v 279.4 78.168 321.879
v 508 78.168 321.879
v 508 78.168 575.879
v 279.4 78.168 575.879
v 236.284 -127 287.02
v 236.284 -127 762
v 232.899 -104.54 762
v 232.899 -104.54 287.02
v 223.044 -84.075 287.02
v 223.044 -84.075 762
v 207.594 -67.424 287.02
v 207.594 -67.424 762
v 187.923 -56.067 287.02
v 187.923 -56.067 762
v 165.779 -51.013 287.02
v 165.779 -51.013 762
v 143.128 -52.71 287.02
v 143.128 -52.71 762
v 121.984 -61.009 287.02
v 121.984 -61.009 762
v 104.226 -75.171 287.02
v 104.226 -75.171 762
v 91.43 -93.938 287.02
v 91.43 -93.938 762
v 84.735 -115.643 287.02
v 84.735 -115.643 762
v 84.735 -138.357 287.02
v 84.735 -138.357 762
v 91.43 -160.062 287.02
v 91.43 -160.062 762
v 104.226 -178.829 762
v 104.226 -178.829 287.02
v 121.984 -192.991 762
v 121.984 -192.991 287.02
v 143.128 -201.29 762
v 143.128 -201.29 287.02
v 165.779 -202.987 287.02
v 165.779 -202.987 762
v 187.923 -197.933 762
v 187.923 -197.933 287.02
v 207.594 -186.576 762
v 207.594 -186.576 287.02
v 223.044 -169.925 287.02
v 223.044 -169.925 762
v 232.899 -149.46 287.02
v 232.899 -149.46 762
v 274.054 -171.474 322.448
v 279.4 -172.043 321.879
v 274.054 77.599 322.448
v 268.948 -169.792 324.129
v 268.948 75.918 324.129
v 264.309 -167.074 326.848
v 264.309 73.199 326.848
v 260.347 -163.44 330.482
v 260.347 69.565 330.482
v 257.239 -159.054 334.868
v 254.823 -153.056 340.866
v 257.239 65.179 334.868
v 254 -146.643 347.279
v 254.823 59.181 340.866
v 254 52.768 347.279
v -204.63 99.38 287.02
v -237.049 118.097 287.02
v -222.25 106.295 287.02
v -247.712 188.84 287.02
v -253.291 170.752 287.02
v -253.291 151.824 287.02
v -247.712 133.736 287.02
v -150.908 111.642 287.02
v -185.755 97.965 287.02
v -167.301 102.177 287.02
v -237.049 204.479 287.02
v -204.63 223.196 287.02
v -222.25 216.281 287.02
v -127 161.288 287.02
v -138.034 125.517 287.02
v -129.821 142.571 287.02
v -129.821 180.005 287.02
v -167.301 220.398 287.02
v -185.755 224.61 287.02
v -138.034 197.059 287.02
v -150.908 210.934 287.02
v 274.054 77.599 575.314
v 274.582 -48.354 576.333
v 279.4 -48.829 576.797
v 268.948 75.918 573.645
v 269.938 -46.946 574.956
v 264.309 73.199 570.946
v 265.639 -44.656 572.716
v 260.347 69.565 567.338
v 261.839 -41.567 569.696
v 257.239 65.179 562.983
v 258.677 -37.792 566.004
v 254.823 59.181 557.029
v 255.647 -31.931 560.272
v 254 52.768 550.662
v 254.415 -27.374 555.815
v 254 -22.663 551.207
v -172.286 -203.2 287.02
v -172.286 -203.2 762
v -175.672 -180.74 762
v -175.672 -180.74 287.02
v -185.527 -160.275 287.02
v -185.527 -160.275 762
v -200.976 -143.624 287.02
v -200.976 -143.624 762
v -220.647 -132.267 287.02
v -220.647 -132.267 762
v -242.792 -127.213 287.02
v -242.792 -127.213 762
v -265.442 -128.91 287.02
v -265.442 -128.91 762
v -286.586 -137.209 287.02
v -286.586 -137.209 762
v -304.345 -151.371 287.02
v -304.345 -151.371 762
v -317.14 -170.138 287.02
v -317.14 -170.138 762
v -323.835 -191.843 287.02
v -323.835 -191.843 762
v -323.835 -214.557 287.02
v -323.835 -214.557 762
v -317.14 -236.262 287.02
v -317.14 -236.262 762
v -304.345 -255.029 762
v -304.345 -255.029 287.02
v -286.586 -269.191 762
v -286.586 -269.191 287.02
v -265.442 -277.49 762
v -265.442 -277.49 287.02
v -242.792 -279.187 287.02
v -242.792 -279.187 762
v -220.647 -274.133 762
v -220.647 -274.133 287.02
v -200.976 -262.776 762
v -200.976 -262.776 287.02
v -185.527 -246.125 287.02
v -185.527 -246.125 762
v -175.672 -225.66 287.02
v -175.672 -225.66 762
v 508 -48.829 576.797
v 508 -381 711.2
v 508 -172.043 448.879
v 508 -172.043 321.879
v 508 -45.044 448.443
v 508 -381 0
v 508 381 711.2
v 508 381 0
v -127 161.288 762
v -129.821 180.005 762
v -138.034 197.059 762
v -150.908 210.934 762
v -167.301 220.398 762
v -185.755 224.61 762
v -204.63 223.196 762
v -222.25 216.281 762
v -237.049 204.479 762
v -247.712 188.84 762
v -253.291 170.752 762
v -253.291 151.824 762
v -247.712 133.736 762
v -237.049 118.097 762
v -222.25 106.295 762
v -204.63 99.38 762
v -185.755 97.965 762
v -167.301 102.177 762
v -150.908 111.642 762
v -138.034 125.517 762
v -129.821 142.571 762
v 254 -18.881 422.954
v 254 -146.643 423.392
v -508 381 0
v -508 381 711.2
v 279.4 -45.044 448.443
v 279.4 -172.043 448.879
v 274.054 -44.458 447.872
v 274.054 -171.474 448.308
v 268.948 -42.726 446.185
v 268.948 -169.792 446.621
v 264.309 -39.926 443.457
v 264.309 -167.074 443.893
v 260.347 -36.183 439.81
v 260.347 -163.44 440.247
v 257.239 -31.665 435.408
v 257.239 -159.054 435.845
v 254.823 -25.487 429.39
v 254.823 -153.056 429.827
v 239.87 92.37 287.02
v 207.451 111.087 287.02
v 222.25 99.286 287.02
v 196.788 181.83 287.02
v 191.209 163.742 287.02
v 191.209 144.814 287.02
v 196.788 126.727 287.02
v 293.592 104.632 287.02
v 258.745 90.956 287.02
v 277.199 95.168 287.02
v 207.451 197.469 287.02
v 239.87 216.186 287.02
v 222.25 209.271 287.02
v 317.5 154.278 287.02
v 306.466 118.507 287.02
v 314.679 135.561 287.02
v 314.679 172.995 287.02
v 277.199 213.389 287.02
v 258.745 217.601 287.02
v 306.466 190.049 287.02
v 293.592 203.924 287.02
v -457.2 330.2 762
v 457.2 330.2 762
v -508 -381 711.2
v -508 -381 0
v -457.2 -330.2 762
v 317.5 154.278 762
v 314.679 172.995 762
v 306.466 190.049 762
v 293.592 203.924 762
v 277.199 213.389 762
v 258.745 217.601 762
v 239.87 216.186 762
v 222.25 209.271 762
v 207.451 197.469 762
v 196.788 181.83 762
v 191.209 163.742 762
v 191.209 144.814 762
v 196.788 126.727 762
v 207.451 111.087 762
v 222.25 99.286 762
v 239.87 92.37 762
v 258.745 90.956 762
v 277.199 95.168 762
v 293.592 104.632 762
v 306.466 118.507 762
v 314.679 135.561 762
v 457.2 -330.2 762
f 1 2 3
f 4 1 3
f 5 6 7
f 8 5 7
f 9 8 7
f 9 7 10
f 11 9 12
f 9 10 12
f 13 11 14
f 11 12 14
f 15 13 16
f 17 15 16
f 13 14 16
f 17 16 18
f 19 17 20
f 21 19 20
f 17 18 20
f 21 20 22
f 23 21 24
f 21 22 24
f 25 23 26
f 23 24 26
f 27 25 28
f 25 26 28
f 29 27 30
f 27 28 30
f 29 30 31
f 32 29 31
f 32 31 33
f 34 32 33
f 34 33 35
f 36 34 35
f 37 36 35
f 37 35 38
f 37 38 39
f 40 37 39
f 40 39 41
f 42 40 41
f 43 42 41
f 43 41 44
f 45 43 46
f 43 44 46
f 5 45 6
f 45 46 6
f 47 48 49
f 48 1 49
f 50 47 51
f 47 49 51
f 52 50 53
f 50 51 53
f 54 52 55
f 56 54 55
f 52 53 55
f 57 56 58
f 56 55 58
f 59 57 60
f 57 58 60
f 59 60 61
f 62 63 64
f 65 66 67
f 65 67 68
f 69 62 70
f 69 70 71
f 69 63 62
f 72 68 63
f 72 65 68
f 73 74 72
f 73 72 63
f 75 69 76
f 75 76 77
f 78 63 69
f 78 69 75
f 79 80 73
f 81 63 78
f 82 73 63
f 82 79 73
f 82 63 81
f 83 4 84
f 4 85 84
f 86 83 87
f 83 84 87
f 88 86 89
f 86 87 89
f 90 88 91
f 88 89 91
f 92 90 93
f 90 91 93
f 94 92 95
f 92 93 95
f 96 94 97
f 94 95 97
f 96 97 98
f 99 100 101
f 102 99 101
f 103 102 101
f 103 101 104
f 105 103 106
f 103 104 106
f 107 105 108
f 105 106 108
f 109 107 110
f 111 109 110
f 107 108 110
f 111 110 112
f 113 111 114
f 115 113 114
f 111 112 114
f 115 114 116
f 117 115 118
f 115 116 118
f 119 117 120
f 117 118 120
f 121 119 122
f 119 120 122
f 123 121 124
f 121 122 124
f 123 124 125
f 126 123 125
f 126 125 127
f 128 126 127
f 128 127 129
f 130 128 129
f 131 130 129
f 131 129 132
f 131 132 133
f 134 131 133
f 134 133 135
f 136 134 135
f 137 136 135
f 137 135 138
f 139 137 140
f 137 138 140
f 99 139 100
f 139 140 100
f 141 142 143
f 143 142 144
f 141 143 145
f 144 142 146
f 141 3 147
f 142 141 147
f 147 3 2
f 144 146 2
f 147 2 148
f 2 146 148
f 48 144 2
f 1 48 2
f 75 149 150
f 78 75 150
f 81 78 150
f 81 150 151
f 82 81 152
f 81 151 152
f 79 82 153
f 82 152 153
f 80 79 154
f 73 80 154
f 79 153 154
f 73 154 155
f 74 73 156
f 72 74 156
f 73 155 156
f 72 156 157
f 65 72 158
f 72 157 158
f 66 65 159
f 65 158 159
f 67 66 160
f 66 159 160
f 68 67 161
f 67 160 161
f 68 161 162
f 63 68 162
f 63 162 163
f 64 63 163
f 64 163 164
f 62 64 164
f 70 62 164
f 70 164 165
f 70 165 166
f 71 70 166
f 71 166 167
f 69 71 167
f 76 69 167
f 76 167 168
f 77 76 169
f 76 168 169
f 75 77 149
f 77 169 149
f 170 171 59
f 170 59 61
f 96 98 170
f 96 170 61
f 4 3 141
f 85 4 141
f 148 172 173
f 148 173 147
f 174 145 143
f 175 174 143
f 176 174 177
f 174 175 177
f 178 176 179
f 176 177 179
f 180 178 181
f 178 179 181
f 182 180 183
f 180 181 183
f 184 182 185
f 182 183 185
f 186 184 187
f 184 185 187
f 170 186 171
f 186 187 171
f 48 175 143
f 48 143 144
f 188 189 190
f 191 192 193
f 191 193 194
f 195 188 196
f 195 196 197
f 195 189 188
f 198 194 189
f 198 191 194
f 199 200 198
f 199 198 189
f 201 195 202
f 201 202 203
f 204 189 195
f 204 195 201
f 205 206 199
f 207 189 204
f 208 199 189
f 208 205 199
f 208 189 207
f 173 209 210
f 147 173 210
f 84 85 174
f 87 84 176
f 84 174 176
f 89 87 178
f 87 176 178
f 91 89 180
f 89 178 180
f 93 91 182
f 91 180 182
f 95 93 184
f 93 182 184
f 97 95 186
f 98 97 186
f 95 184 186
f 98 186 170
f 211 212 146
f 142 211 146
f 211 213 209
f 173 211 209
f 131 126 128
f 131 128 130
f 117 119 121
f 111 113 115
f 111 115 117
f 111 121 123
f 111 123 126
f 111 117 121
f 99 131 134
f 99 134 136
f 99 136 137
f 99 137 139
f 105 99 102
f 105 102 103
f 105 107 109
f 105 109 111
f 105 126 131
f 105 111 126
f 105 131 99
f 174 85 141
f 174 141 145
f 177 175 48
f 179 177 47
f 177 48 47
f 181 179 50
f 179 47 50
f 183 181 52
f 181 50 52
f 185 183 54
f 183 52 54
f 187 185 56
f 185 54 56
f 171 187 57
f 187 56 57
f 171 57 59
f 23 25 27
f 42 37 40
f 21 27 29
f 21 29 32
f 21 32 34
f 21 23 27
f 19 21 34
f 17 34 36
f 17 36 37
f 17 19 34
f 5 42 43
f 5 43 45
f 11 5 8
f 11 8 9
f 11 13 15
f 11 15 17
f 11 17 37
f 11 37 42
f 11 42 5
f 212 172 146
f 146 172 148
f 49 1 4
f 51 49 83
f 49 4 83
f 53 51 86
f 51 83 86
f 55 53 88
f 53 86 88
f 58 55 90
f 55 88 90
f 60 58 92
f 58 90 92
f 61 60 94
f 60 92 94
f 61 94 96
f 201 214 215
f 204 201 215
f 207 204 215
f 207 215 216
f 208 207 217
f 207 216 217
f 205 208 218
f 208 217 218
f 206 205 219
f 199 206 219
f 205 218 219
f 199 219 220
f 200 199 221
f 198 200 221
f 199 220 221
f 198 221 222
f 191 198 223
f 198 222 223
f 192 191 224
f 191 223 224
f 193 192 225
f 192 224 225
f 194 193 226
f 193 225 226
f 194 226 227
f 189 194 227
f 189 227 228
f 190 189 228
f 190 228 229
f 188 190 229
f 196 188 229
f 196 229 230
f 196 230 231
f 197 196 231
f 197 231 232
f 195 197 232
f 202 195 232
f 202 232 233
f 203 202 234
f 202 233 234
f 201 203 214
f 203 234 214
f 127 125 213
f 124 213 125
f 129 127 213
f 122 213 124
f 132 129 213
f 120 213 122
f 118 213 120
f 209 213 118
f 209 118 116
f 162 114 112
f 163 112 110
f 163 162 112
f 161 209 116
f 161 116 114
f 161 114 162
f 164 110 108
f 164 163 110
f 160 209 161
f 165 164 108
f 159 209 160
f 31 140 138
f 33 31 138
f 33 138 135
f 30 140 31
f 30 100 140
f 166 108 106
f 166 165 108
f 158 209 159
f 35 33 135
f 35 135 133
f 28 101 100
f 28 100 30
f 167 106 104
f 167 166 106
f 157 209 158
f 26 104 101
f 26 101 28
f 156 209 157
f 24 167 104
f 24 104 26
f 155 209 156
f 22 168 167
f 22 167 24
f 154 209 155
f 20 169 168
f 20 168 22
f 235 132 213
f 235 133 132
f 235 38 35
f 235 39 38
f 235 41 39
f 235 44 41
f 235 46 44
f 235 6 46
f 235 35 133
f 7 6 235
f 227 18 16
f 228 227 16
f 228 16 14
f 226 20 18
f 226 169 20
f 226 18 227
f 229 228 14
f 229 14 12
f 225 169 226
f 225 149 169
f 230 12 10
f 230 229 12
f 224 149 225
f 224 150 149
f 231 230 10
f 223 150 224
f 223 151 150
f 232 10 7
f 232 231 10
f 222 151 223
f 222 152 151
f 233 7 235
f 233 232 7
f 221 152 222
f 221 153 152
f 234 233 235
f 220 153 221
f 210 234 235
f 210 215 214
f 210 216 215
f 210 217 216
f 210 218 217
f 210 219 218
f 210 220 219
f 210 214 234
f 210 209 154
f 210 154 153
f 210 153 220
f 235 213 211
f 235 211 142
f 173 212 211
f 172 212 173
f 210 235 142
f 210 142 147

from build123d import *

# Parameters (mm, degrees)
F0_W     = 1016
F0_H     = 762
F1_DEPTH = 762
F2_SIZE  = 50.8
F3_R     = 63.5
F3_R_2   = 76.2
F4_DEPTH = 474.98
F6_DEPTH = 254
F7_R     = 25.4


with BuildPart() as f1:
    # F0 (on Top) → F1 (new body)
    with BuildSketch(Plane.XY):
        Rectangle(F0_W, F0_H)
    extrude(amount=F1_DEPTH)

    # F2
    f2_edges = [f1.edges().sort_by_distance(p)[0] for p in [
        (0, -381, 762),
        (508, 0, 762),
        (0, 381, 762),
        (-508, 0, 762),
    ]]
    chamfer(f2_edges, length=F2_SIZE)

    # F3 (on face) → F4 (cut)
    with BuildSketch(Plane.XY.offset(762)):
        with Locations((254, 154.278123)):
            Circle(F3_R)
        with Locations((160.084128, -127)):
            Circle(F3_R_2)
        with Locations((-190.5, 161.287912)):
            Circle(F3_R)
        with Locations((-248.486163, -203.2)):
            Circle(F3_R_2)
    extrude(amount=-F4_DEPTH, mode=Mode.SUBTRACT)

    # F5 (on face) → F6 (cut)
    with BuildSketch(Plane.YZ.offset(508)):
        Polygon((-172.04284, 448.87892), (-172.04284, 321.87892), (78.168072, 321.87892), (78.168072, 575.87892), (-48.828607, 576.797382), (-45.043587, 448.443412), align=None)
    extrude(amount=-F6_DEPTH, mode=Mode.SUBTRACT)

    # F7
    f7_edges = [f1.edges().sort_by_distance(p)[0] for p in [
        (254, -108.543213, 448.661166),
        (254, -46.936097, 512.620397),
        (254, 14.669732, 576.338151),
        (254, 78.168072, 448.87892),
        (254, -46.937384, 321.87892),
        (254, -172.04284, 385.37892),
    ]]
    fillet(f7_edges, radius=F7_R)


solid = f1.part
